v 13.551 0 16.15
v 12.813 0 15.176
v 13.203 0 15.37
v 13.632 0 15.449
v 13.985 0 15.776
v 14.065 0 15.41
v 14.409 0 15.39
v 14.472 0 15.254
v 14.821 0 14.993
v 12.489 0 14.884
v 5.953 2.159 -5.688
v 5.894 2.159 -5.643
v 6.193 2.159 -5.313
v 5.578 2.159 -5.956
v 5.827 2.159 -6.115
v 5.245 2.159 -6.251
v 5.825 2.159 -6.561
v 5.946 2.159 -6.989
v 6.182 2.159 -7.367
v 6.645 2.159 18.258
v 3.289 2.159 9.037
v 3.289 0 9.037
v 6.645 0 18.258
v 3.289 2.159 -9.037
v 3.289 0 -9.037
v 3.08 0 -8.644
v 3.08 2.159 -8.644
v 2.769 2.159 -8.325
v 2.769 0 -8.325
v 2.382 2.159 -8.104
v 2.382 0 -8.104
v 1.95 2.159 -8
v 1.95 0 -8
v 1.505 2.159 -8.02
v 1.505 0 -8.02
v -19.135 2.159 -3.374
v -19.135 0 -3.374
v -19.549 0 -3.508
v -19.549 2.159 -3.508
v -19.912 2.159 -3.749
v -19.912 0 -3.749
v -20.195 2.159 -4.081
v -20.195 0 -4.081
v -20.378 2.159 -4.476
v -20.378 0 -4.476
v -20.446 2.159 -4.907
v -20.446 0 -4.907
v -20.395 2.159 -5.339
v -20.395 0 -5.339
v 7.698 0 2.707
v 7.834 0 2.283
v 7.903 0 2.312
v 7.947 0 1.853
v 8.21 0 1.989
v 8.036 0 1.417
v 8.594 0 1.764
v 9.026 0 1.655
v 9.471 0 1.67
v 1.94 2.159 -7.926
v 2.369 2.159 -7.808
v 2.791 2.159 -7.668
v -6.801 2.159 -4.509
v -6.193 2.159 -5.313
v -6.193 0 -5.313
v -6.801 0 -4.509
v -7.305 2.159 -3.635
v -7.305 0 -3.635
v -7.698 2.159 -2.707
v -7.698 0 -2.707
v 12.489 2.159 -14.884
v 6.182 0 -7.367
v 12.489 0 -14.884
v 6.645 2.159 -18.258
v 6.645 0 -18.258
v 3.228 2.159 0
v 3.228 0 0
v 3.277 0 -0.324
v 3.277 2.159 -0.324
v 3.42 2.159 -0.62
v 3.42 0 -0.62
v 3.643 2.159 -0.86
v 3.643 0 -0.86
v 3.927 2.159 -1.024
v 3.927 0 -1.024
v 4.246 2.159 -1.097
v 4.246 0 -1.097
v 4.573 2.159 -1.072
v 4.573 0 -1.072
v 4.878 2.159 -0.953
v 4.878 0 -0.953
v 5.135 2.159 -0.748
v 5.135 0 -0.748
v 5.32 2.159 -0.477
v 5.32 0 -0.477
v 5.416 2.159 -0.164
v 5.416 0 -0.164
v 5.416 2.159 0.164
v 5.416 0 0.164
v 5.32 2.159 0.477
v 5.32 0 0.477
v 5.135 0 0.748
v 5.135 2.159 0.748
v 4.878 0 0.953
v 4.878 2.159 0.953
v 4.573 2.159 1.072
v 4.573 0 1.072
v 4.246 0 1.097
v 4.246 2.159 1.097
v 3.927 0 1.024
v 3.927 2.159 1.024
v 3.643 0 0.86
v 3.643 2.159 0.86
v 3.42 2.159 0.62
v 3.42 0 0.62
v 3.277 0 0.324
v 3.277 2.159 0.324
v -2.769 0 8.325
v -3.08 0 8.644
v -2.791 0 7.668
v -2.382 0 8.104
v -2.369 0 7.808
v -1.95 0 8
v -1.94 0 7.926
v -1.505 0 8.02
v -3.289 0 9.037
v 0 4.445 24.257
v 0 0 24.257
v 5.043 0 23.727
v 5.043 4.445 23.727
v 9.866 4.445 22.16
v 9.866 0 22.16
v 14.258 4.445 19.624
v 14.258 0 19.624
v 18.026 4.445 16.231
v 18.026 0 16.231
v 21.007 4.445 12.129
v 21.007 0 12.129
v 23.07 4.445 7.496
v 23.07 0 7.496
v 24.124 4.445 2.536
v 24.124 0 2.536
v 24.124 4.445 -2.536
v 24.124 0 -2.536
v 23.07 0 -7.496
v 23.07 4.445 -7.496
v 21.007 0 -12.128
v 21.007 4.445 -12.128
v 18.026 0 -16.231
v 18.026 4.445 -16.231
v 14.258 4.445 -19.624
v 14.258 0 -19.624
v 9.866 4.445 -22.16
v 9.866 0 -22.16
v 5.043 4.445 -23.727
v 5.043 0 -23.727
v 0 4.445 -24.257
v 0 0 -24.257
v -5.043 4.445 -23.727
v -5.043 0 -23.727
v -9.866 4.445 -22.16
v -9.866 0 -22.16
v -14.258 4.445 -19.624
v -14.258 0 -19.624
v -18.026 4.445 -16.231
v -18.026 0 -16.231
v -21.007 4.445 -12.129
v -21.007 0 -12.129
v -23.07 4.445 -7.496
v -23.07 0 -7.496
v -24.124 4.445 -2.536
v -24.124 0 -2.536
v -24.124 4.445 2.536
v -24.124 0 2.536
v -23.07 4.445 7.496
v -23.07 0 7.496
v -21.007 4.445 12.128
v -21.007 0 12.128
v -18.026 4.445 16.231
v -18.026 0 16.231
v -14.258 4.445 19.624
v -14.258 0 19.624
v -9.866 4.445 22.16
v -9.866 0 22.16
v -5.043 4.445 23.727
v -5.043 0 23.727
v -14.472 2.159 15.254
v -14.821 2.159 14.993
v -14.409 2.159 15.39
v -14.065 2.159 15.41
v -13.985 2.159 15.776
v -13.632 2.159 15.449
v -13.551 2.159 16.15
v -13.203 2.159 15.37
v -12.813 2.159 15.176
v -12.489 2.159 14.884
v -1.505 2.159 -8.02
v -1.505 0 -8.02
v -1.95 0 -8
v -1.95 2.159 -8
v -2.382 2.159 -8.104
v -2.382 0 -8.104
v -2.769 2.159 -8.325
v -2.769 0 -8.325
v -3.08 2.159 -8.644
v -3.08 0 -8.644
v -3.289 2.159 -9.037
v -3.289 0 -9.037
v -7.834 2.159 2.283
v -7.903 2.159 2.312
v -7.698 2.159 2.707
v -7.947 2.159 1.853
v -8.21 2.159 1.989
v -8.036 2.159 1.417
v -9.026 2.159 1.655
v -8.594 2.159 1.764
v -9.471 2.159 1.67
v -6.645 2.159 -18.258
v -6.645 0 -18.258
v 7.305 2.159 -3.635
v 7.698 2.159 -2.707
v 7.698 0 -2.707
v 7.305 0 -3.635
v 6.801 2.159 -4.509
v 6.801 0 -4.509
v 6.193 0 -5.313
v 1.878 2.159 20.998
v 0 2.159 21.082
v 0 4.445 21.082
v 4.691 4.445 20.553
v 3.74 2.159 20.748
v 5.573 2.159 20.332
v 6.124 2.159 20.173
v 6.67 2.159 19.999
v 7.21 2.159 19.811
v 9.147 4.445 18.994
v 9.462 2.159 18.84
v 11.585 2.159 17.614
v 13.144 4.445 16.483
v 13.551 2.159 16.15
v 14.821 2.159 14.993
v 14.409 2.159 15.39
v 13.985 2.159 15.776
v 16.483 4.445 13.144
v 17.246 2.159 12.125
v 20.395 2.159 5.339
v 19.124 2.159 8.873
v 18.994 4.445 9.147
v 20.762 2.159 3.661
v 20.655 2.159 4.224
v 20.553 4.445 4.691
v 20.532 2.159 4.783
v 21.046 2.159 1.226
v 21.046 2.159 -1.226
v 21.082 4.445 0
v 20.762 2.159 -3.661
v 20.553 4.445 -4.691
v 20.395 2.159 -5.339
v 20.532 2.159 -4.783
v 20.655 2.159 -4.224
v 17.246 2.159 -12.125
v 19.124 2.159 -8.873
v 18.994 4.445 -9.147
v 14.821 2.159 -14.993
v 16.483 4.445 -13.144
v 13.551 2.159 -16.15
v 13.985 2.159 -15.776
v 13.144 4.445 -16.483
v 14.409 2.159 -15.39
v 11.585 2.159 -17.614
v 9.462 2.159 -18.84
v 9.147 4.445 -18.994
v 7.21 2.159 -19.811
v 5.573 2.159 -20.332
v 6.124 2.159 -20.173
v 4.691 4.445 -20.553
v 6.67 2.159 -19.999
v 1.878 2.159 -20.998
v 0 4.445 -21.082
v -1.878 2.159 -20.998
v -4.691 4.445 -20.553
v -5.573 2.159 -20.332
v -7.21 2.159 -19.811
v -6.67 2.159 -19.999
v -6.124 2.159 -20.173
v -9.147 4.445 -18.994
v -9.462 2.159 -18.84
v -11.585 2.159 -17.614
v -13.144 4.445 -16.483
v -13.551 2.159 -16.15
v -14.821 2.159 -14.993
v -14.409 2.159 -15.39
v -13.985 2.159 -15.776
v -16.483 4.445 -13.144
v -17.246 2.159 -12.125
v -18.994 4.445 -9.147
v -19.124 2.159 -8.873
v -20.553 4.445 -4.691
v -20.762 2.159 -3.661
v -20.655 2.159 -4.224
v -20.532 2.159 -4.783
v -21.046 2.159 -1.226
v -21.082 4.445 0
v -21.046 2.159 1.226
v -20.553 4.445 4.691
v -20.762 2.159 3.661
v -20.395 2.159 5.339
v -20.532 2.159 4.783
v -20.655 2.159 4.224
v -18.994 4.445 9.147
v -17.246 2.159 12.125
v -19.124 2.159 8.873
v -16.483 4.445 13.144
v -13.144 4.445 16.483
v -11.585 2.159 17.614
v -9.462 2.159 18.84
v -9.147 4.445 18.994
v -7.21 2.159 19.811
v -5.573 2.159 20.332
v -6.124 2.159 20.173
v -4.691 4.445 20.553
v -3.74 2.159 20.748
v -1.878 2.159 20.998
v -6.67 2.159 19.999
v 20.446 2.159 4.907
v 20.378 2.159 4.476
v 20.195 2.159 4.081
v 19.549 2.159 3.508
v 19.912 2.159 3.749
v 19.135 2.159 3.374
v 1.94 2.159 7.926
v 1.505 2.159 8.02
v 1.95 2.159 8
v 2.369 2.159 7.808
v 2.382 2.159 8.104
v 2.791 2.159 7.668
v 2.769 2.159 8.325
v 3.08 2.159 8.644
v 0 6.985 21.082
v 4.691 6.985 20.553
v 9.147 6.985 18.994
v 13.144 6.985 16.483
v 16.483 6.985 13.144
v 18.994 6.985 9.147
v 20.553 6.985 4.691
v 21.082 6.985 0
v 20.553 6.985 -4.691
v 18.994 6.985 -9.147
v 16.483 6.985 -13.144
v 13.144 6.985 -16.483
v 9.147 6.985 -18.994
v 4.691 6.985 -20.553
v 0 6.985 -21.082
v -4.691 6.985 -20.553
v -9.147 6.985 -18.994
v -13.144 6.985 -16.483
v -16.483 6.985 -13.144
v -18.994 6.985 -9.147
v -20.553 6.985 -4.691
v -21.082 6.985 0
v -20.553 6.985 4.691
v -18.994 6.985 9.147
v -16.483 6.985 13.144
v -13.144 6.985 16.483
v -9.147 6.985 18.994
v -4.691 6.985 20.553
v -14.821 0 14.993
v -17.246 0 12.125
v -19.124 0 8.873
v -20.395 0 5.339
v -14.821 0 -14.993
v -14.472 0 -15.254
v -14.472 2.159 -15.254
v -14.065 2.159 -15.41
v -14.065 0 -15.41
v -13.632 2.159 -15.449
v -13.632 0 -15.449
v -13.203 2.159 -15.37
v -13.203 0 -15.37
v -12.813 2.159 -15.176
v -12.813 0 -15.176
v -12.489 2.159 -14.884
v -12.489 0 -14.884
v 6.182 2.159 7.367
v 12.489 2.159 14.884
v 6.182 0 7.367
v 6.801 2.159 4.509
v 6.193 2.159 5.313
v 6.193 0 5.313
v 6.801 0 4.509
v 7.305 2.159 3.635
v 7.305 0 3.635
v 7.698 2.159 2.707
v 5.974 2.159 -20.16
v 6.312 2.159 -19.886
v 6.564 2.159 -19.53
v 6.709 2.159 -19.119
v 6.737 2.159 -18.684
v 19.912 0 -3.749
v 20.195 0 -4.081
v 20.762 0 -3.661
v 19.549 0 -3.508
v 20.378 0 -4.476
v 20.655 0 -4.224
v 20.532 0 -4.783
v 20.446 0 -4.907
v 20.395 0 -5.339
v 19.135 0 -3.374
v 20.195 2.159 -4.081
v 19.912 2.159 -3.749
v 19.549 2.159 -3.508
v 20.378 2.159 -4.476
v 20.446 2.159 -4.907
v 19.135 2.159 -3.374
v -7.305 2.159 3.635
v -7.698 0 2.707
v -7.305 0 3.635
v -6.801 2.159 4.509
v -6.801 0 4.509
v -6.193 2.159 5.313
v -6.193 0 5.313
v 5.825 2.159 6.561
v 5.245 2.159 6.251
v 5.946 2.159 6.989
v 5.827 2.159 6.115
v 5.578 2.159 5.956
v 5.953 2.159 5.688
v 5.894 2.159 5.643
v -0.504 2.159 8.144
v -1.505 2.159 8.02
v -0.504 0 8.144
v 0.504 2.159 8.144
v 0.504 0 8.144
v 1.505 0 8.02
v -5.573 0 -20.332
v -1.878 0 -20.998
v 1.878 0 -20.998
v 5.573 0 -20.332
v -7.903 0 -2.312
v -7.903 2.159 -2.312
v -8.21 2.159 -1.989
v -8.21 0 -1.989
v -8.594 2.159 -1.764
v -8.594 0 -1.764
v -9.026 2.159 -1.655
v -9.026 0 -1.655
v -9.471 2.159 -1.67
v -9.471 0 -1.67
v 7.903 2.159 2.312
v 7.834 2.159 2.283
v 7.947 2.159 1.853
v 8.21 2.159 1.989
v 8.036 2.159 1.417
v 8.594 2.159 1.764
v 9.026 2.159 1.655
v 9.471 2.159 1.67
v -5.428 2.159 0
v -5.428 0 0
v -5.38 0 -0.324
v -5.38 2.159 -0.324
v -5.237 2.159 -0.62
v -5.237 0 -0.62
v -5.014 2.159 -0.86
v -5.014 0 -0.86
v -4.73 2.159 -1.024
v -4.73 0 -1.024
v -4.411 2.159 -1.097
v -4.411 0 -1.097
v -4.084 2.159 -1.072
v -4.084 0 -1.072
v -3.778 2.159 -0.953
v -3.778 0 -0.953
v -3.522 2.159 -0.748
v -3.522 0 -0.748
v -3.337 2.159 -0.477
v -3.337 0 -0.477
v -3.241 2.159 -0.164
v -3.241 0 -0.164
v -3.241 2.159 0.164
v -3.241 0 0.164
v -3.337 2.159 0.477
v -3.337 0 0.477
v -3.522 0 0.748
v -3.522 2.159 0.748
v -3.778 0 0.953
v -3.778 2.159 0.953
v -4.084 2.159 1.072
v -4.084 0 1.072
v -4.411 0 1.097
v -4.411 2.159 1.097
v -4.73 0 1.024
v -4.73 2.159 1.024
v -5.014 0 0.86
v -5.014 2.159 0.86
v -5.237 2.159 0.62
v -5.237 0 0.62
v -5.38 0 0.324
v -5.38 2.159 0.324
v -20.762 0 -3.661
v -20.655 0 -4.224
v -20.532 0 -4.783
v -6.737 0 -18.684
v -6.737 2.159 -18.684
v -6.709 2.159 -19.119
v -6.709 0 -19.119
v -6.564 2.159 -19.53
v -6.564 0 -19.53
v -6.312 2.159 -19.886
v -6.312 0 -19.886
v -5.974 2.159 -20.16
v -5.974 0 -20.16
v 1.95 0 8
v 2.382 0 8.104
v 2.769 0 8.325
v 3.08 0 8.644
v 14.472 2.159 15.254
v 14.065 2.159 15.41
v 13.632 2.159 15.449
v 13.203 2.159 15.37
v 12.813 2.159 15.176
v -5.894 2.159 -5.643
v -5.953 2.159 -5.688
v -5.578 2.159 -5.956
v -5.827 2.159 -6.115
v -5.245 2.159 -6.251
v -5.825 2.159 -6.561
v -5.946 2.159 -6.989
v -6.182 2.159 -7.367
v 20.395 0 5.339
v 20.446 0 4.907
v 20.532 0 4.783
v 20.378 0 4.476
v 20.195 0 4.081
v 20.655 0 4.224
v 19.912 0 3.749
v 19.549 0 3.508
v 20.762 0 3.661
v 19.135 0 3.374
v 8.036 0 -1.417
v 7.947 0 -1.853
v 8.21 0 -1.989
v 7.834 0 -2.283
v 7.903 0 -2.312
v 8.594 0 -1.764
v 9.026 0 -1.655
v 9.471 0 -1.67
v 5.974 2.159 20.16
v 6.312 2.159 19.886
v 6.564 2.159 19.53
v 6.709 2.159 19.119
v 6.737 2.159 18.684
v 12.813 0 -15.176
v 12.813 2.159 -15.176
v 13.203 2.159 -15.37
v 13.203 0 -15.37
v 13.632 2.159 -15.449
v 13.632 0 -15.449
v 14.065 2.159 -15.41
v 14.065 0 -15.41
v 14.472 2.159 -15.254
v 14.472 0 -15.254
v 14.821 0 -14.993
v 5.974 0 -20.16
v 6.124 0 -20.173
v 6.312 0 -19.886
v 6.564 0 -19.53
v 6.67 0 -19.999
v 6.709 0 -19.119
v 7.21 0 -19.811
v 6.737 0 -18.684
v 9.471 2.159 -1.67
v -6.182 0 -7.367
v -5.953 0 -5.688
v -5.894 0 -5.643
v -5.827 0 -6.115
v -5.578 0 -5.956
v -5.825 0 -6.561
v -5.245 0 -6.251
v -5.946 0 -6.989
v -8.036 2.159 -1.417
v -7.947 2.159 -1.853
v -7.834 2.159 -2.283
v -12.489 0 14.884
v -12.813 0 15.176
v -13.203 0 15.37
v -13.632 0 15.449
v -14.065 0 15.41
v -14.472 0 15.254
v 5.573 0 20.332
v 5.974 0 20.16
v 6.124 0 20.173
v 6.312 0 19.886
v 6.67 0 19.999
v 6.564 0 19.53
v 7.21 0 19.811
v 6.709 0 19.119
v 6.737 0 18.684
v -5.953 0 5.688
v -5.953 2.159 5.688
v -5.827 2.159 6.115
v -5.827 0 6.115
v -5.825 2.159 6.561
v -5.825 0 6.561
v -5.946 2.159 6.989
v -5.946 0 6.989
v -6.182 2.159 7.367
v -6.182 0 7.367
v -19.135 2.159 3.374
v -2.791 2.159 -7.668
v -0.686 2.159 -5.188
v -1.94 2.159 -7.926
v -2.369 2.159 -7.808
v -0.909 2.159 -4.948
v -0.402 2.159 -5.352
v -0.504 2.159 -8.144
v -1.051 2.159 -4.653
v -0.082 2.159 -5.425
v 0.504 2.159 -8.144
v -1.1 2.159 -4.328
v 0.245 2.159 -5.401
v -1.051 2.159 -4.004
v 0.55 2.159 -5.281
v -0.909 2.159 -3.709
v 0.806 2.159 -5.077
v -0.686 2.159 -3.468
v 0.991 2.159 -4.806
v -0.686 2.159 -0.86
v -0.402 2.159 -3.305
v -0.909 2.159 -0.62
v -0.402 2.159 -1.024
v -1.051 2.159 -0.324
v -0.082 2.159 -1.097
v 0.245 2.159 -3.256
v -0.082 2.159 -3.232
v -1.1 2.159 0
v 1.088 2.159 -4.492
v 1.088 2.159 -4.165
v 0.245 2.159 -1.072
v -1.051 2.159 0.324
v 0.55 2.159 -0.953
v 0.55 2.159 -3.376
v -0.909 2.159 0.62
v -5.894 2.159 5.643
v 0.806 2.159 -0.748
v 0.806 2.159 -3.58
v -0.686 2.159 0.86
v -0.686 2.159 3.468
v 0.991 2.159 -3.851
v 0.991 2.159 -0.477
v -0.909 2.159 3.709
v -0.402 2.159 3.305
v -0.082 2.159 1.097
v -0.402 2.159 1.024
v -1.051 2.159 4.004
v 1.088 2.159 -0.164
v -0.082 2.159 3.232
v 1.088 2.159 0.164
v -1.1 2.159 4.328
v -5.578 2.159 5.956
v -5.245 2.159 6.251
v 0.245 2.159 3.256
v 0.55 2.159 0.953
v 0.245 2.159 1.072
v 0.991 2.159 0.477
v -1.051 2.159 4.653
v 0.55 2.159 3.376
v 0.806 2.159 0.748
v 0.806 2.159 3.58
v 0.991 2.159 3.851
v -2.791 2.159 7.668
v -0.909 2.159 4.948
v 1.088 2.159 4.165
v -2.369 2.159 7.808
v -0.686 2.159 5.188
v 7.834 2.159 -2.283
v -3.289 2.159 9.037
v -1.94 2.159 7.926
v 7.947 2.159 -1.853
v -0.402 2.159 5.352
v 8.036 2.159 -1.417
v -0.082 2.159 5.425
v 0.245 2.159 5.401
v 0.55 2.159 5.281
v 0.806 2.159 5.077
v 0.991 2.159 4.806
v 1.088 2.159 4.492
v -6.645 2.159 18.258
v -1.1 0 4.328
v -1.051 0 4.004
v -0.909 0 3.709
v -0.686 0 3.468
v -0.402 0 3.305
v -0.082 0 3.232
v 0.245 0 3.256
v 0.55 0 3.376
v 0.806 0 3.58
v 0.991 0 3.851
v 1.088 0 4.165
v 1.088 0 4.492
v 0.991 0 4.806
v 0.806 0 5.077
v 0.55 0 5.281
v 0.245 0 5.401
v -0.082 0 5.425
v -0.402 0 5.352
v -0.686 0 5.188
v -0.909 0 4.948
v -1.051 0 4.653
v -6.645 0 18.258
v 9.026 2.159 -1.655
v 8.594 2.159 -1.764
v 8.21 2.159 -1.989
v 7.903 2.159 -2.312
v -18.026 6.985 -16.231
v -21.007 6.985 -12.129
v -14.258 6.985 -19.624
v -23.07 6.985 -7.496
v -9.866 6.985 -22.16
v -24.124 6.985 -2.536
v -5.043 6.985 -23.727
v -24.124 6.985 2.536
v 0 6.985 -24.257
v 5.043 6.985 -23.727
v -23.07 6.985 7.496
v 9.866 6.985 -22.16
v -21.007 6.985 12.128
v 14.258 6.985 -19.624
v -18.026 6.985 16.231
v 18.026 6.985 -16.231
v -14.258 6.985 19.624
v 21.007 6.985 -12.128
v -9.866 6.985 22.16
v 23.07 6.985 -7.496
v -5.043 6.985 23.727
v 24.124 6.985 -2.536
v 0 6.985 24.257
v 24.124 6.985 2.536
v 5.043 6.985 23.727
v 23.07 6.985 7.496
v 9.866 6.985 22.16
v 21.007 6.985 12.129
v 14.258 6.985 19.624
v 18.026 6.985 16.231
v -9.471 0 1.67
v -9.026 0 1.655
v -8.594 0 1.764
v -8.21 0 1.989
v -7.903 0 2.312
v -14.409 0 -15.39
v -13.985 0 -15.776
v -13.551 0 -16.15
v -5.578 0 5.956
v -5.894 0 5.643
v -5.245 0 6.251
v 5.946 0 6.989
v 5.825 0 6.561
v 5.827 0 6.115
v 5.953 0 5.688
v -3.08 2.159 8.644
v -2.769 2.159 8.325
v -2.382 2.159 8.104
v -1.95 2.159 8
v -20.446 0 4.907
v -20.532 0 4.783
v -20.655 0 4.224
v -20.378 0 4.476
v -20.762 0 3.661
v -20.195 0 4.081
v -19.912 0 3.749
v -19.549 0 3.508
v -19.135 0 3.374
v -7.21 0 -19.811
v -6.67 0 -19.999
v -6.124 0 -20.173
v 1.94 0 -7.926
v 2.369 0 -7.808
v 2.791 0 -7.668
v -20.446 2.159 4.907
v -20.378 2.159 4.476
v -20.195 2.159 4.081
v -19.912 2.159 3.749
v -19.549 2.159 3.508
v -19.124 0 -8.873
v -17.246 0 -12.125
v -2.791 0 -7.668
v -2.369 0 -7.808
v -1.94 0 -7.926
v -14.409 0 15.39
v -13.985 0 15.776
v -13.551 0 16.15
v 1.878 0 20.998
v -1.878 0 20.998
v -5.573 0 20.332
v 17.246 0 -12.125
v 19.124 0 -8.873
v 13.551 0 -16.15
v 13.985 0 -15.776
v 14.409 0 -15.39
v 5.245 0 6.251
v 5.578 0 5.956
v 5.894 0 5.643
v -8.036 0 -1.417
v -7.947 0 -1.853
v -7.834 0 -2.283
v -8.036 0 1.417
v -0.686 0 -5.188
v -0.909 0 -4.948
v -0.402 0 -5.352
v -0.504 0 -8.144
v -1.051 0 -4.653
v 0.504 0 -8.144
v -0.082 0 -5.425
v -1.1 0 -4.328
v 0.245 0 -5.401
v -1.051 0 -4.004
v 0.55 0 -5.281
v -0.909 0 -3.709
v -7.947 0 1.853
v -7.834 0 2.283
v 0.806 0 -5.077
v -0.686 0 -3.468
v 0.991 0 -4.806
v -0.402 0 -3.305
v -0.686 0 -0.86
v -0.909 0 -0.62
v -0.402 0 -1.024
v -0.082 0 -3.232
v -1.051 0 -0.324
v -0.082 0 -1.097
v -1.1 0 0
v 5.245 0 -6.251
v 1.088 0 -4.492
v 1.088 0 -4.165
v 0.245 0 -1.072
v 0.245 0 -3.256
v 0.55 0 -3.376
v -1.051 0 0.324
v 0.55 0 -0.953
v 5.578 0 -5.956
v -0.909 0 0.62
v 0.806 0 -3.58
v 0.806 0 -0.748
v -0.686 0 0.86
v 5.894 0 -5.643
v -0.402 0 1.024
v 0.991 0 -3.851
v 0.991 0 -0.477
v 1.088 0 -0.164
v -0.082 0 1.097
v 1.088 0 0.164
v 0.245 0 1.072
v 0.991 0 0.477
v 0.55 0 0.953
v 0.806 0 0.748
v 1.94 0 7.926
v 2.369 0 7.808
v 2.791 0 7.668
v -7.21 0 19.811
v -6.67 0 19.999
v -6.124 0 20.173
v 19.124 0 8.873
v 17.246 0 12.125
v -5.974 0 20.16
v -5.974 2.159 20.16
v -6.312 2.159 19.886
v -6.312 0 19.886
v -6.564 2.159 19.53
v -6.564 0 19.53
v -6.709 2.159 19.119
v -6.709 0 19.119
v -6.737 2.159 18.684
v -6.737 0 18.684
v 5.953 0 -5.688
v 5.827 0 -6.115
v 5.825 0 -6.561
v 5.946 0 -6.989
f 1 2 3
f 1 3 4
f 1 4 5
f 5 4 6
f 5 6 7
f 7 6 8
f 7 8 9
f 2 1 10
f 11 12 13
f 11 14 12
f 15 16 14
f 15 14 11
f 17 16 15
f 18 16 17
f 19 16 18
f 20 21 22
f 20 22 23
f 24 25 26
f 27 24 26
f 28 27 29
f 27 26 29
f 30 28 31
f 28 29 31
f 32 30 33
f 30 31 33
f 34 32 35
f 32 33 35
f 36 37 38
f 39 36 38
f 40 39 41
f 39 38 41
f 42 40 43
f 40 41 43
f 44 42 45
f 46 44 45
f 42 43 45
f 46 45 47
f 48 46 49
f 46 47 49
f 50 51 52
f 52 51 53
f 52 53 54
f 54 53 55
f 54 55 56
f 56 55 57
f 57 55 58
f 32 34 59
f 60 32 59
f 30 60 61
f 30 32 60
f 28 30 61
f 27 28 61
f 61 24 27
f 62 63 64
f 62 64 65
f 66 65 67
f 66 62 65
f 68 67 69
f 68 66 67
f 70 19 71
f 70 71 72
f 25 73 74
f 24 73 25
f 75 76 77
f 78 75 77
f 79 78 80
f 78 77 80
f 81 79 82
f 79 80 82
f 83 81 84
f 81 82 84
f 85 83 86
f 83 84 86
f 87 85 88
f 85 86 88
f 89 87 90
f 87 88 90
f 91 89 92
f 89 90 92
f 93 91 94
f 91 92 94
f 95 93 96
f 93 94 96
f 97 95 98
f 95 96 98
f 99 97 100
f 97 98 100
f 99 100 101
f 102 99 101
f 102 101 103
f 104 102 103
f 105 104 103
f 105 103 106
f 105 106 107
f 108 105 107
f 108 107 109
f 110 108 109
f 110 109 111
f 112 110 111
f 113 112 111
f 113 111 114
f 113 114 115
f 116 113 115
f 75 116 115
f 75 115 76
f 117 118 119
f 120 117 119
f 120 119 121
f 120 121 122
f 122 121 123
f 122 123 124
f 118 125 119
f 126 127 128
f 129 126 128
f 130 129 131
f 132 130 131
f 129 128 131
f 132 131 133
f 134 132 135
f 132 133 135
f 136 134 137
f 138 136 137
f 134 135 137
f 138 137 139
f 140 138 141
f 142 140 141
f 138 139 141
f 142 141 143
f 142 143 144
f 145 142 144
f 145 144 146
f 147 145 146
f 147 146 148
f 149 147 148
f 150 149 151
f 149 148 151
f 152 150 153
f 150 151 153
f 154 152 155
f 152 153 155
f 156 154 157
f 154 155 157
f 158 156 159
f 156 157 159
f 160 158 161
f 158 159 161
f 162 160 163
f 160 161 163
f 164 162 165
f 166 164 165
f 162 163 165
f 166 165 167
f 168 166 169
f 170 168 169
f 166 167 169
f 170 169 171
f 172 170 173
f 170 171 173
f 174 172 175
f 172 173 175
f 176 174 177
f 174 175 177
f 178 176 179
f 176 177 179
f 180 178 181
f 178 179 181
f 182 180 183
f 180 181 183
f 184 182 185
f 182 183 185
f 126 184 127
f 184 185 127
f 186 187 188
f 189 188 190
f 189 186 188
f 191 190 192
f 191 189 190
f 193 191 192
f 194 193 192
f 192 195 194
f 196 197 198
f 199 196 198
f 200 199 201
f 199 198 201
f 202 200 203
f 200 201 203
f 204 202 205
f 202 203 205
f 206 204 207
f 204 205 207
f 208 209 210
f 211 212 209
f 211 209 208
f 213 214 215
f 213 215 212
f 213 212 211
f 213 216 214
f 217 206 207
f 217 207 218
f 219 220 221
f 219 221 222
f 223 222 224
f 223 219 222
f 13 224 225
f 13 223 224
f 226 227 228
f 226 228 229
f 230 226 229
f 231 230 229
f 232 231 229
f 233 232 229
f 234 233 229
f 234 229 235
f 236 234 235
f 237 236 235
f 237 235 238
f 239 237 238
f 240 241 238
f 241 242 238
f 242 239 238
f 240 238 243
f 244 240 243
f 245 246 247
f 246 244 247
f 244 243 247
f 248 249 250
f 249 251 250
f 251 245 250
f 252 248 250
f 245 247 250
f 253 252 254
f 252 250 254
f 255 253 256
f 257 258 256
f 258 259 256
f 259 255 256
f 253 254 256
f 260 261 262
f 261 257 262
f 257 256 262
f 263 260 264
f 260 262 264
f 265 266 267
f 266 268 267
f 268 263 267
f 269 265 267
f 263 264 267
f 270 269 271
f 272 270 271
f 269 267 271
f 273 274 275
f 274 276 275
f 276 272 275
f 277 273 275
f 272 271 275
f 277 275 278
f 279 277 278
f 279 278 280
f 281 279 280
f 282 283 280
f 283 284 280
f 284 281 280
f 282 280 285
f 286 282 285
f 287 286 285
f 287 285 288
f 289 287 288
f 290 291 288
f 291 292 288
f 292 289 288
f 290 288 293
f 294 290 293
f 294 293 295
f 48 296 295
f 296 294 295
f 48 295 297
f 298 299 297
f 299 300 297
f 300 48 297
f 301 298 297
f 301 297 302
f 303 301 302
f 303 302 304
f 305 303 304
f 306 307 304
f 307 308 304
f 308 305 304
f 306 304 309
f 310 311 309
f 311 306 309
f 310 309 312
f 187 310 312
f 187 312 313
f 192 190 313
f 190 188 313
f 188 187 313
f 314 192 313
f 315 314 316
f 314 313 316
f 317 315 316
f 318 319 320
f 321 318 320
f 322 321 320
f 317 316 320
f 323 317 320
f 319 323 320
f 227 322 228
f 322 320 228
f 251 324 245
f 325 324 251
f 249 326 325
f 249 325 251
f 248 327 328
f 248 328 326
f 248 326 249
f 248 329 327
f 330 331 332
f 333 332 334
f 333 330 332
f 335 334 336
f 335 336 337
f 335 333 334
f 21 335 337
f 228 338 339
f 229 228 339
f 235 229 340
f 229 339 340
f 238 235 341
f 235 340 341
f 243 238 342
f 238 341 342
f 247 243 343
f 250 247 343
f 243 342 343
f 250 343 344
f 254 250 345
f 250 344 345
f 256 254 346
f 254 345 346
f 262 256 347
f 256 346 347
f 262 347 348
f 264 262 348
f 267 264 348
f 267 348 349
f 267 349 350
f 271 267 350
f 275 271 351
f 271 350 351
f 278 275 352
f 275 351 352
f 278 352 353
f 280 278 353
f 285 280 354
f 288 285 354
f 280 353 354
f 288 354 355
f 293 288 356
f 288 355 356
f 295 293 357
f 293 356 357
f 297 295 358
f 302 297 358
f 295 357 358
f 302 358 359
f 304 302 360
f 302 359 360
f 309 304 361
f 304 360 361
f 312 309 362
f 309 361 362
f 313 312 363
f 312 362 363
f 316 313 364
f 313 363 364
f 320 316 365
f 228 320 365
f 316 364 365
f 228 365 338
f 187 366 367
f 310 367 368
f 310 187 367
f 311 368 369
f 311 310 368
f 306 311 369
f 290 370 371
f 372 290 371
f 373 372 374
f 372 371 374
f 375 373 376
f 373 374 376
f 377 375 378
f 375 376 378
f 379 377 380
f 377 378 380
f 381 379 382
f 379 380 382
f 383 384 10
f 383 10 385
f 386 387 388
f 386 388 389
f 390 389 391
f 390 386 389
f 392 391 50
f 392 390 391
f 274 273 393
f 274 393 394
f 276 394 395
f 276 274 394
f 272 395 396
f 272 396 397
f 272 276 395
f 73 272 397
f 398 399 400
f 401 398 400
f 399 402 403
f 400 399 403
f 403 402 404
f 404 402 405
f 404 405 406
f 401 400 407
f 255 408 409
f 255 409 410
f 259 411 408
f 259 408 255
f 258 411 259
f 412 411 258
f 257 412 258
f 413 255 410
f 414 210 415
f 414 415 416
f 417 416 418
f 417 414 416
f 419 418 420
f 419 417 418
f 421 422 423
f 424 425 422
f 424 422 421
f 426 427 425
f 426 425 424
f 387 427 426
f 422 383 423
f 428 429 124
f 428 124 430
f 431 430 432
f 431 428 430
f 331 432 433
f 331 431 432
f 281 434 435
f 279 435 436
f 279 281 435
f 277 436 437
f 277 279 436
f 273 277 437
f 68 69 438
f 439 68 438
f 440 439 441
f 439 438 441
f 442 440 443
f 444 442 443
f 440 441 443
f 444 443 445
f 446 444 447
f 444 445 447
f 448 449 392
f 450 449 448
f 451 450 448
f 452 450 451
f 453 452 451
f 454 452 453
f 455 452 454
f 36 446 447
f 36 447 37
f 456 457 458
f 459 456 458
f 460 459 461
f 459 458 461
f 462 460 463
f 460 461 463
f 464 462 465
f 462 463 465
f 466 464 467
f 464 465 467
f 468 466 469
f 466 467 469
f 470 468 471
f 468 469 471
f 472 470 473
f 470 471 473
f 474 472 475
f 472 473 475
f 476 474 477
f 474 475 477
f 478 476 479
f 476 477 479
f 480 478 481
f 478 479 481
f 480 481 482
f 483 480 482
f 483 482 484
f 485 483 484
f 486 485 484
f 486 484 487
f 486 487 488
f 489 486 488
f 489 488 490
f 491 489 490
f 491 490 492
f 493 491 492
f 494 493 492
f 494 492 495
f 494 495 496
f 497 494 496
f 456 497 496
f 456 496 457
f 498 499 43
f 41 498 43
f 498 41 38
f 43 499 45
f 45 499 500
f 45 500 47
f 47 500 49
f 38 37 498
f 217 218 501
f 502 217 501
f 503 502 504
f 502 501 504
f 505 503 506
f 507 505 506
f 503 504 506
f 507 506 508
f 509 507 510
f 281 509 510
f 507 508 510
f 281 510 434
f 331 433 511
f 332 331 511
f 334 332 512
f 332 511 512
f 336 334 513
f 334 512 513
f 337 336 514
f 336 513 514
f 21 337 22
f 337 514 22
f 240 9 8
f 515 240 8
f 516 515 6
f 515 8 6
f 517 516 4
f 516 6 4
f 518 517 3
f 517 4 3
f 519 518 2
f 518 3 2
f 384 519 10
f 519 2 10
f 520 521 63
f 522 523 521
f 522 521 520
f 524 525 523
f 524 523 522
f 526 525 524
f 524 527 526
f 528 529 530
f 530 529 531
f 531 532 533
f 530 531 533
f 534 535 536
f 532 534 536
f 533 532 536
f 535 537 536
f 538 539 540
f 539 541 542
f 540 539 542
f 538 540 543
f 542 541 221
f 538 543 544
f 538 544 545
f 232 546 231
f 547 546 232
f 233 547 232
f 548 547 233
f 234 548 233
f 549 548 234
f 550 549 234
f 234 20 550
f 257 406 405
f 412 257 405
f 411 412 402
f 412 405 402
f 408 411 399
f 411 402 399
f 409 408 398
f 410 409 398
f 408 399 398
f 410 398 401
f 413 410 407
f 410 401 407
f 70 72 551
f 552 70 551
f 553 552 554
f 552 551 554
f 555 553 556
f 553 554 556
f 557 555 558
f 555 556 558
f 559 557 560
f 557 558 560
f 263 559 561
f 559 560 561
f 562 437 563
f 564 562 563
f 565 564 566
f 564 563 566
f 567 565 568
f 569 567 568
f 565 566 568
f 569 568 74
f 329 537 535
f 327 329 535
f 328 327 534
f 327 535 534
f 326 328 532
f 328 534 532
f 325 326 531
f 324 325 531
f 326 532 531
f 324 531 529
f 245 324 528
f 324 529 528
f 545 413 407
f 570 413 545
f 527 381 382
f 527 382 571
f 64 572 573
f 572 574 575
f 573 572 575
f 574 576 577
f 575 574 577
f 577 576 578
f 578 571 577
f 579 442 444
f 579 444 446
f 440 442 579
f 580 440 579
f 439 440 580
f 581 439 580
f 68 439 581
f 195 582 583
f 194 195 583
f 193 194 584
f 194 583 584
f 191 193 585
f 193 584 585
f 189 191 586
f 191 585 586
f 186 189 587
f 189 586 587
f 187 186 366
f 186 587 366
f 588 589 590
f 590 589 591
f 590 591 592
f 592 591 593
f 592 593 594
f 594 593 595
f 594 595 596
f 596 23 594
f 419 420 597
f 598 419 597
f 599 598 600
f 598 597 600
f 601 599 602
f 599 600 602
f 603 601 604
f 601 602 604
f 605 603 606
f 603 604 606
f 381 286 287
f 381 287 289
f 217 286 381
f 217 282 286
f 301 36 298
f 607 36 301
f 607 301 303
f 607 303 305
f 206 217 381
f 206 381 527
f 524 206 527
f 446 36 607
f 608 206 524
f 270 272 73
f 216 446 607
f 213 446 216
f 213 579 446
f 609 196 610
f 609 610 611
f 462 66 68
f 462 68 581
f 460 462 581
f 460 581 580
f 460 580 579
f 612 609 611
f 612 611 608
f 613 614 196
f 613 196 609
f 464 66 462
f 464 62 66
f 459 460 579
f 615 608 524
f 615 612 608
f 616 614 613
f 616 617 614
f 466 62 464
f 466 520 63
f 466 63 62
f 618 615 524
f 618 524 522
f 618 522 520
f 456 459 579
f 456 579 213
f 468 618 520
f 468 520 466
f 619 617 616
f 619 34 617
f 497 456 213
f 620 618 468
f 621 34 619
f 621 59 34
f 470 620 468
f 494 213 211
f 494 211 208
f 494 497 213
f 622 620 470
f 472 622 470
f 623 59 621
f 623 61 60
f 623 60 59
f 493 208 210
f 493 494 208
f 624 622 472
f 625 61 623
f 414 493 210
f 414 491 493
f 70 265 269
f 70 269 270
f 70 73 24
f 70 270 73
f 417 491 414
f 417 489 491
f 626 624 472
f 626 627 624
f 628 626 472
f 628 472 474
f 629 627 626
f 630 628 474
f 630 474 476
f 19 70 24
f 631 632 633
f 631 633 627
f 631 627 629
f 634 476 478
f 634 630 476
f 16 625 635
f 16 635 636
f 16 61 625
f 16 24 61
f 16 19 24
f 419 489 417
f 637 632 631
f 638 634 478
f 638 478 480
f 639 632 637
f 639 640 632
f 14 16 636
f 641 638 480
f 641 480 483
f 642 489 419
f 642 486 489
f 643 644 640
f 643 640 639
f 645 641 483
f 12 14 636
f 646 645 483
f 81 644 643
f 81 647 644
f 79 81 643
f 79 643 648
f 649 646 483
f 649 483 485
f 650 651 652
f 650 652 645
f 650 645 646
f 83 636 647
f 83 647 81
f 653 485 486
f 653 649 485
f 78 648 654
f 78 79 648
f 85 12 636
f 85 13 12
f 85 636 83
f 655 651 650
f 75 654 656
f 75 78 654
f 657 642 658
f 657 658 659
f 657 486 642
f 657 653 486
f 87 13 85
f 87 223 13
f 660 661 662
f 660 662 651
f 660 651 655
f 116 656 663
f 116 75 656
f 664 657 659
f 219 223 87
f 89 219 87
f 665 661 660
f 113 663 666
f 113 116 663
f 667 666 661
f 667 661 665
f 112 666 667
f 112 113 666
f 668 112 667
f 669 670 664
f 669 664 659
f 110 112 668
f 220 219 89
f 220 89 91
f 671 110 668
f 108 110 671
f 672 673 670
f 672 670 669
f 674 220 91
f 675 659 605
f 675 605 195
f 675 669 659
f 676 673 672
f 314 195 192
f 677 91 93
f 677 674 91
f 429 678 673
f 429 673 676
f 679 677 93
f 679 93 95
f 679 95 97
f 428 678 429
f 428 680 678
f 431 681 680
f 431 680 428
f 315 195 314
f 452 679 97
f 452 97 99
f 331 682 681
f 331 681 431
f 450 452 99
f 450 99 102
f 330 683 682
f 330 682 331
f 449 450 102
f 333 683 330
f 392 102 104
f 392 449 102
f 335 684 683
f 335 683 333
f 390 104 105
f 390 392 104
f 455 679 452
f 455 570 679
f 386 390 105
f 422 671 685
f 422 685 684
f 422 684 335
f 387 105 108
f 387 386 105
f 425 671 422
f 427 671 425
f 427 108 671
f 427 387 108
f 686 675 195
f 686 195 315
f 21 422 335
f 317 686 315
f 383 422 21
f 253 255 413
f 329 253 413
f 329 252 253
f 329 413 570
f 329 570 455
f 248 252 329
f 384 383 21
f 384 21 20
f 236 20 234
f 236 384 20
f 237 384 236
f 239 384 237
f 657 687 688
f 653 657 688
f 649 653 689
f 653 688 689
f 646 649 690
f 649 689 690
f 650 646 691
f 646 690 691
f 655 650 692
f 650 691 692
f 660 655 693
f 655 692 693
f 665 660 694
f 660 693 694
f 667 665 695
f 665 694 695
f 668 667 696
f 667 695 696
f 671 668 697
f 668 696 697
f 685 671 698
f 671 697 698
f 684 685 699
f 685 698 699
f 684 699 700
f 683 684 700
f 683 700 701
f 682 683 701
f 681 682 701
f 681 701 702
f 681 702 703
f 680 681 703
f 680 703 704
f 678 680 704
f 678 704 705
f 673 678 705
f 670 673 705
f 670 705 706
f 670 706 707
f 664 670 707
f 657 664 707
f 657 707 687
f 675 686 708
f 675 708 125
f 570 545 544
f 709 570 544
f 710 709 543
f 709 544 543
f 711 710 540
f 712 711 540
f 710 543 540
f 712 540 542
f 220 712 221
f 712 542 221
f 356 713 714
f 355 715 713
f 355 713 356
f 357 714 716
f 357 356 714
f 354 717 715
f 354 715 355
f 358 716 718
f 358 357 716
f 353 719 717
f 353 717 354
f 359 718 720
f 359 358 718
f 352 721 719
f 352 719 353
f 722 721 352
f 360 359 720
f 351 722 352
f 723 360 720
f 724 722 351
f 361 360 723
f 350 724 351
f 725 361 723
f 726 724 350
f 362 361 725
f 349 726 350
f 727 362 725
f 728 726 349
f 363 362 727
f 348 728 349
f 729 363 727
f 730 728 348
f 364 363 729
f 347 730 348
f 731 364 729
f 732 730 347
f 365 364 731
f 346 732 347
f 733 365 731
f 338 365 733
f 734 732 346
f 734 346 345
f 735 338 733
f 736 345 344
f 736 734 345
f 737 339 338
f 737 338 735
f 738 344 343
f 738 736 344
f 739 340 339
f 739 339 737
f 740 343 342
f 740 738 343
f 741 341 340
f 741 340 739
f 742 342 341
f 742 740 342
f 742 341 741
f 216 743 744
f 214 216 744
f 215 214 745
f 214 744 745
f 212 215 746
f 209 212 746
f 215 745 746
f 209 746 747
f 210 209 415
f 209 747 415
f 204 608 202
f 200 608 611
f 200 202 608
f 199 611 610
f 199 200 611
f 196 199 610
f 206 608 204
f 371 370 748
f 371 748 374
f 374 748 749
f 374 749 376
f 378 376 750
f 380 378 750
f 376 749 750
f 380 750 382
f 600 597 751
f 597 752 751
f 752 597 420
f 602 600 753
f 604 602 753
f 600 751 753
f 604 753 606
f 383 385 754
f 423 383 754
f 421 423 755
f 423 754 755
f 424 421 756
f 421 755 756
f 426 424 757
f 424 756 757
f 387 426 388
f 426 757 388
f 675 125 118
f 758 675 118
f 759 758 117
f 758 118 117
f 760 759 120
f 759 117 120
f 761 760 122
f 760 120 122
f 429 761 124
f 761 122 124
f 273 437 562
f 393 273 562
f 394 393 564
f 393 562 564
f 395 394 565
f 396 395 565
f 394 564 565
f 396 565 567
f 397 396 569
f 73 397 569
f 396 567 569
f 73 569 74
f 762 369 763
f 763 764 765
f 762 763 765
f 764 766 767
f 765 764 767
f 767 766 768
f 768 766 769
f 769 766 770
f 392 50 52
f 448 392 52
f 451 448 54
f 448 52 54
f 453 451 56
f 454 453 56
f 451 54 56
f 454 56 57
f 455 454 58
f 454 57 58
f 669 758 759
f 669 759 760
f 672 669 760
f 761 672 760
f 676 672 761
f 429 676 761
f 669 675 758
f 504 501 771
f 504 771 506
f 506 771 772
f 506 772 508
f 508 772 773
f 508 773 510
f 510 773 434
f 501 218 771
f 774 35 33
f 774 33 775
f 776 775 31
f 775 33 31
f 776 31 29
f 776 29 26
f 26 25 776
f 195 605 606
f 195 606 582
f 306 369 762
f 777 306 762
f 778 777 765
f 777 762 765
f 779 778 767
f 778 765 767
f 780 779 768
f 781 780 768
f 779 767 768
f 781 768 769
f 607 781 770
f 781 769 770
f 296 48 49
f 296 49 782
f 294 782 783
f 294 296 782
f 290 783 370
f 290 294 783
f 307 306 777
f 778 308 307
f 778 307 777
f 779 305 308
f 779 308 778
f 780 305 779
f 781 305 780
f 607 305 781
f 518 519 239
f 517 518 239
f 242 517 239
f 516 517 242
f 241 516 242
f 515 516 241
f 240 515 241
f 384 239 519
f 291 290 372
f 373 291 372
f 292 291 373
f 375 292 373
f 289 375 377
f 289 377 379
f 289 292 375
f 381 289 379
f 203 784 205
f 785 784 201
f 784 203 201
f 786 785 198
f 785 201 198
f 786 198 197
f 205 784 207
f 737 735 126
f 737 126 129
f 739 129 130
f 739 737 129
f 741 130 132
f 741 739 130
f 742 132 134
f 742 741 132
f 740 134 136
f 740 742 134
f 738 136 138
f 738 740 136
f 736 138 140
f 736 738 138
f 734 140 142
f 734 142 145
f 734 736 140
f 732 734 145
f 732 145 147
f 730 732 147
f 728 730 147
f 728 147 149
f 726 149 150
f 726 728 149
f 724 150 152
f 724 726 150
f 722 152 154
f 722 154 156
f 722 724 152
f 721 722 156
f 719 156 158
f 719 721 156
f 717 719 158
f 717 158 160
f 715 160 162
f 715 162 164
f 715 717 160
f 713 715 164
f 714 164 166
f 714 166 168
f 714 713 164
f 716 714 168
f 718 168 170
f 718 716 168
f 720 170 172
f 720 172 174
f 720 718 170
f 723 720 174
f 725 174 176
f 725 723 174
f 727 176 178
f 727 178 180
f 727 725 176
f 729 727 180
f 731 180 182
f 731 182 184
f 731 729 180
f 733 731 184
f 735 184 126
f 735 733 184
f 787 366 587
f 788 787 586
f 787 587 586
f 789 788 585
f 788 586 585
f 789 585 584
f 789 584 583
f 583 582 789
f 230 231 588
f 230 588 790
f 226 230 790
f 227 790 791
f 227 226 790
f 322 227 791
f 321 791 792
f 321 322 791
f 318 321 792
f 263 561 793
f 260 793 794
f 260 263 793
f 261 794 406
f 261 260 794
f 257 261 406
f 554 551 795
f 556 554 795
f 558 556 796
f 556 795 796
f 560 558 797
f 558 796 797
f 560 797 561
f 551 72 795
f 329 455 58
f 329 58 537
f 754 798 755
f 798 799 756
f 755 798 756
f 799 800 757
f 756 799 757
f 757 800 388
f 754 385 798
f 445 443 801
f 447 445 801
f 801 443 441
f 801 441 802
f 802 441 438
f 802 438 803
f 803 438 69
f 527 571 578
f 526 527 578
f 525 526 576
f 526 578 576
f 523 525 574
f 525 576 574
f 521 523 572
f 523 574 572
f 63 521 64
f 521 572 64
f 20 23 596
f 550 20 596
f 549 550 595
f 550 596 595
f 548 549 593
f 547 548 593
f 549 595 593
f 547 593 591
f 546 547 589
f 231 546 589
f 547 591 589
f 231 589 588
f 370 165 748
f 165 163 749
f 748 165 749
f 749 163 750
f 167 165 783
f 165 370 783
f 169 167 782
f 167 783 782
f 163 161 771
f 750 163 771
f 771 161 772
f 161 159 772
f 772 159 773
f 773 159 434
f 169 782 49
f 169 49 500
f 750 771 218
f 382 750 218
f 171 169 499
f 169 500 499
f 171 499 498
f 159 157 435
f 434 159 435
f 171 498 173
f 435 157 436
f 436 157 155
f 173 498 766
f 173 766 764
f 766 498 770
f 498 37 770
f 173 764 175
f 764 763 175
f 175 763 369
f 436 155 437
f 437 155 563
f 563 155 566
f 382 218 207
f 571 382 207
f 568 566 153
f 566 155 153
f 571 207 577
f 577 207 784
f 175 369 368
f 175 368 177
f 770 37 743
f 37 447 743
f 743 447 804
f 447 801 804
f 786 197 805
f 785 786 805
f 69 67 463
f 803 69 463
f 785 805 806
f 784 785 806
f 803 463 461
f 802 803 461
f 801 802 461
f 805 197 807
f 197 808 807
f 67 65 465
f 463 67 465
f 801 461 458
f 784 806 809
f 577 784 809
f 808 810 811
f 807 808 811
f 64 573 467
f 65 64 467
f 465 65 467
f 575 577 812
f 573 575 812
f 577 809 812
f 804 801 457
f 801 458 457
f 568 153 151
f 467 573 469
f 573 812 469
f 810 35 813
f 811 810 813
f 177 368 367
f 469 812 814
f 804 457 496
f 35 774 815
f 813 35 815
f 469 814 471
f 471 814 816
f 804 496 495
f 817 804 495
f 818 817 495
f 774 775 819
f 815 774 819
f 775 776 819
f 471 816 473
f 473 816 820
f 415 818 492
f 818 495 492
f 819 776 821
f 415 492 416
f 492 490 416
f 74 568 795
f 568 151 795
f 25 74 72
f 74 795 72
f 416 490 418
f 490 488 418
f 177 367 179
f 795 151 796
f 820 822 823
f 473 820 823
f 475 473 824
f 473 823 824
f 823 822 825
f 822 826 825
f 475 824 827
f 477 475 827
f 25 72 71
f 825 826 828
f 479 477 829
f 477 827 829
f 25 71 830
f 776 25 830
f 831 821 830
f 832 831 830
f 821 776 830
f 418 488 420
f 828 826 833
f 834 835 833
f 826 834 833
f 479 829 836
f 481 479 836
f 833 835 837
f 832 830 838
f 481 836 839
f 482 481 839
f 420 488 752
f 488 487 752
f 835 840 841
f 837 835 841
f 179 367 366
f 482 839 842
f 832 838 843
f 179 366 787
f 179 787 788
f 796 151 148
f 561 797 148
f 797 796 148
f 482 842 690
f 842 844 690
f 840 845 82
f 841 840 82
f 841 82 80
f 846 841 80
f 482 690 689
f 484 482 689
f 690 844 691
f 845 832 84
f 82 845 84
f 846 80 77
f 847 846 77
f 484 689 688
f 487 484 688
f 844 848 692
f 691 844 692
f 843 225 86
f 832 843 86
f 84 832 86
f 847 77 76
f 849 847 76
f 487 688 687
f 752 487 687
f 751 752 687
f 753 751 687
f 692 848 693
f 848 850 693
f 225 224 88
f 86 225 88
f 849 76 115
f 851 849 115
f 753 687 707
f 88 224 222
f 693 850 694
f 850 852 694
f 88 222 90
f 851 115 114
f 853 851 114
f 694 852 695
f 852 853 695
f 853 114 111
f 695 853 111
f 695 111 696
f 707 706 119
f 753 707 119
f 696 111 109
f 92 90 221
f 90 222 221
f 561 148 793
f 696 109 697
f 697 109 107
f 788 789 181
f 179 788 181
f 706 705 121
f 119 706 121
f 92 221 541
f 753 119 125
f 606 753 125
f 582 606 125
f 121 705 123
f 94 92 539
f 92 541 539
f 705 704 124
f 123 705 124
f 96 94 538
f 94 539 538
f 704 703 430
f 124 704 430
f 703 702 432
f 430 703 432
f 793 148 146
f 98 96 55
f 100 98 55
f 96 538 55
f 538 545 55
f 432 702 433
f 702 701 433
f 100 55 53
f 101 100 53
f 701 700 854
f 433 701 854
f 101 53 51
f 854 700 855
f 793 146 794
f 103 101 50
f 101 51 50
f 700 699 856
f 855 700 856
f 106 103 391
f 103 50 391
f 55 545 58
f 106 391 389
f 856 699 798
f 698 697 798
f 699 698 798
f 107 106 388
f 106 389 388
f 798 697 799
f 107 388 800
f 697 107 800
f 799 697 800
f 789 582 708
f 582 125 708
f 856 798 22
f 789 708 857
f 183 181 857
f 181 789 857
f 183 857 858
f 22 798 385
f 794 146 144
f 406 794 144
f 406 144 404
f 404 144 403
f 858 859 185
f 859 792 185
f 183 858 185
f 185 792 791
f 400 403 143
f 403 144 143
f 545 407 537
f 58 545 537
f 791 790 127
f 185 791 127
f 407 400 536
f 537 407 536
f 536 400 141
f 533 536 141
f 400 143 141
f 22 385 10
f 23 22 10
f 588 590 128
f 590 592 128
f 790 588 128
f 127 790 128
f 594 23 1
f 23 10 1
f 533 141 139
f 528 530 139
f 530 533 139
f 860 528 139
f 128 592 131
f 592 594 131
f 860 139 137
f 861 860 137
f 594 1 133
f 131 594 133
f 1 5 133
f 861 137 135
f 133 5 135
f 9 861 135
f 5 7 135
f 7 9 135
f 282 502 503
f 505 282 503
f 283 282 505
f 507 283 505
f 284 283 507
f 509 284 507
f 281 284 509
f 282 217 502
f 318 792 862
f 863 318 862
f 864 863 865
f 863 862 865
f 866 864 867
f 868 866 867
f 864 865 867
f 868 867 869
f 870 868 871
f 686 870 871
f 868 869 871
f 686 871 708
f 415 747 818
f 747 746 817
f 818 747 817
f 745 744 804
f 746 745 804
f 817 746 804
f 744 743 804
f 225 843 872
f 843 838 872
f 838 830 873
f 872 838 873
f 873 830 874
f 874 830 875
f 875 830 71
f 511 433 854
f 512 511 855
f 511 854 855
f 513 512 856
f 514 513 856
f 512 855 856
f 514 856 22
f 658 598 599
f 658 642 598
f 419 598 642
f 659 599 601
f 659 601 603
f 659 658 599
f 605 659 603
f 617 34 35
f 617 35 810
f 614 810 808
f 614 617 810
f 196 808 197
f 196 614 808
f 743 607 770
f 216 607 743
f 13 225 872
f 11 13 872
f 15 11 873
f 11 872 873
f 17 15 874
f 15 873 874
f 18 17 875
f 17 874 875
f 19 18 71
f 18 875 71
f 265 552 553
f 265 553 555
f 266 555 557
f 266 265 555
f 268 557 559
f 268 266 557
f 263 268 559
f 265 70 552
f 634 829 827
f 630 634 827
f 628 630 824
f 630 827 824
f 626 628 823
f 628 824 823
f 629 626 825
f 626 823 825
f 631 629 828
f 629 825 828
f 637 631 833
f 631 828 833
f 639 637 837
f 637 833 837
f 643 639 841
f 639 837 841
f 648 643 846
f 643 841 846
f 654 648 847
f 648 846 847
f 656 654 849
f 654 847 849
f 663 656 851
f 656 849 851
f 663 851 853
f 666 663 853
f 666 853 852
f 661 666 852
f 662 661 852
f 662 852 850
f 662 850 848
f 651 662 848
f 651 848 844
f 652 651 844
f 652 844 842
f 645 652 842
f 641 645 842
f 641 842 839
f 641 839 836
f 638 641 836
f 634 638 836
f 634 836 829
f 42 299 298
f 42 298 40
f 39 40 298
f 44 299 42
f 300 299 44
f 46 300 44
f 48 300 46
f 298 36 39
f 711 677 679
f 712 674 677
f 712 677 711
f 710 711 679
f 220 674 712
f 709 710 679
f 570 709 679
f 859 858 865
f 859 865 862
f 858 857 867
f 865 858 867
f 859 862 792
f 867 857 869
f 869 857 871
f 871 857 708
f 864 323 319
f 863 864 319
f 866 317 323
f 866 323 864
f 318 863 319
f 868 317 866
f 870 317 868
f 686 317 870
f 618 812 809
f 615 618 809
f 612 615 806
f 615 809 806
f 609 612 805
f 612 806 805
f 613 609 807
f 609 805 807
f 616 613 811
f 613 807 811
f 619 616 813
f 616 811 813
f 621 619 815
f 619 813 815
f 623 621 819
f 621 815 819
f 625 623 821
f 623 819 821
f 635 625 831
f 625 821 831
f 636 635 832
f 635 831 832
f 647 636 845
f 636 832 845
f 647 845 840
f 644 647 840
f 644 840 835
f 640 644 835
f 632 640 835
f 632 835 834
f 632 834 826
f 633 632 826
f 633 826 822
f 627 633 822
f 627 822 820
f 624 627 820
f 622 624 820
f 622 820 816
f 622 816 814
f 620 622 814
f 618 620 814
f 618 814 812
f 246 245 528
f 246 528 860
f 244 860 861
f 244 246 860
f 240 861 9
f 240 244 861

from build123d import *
from build123d.topology import SkipClean

# Parameters (mm, degrees)
SKETCH1_R            = 24.257
BOSS_EXTRUDE1_DEPTH  = 4.445
M2_CLEARANCE_HOLE1_D = 2.2
SKETCH4_R            = 21.082
CUT_EXTRUDE1_DEPTH   = 2.286
CUT_EXTRUDE2_DEPTH   = 35.380661628
FILLET1_DEPTH        = 2.159
BOSS_EXTRUDE2_START  = 2.54
SKETCH6_R            = 24.257
SKETCH6_R_2          = 21.082
BOSS_EXTRUDE2_DEPTH  = 2.54


with BuildPart() as part:
    # Sketch1 → Boss-Extrude1 (new body)
    with BuildSketch(Plane(origin=(0, 0, 0), x_dir=(1, 0, 0), z_dir=(0, 1, 0))):
        with Locations(Location((0, 0, 0), (0, 0, 270))):
            Circle(SKETCH1_R)
    extrude(amount=BOSS_EXTRUDE1_DEPTH)

    # M2 Clearance Hole1 (through all)
    with Locations(Plane(origin=(0, 4.445, 0), x_dir=(1, 0, 0), z_dir=(0, 1, 0))):
        with Locations((0, 0), (0, 4.32848345), (0, -4.32848345), (-4.32848345, 0), (4.32848345, 0)):
            Hole(M2_CLEARANCE_HOLE1_D / 2)

    # Sketch4 → Cut-Extrude1 (cut)
    with BuildSketch(Plane(origin=(0, 4.445, 0), x_dir=(1, 0, 0), z_dir=(0, 1, 0))):
        with Locations(Location((0, 0, 0), (0, 0, 270))):
            Circle(SKETCH4_R)
    extrude(amount=-CUT_EXTRUDE1_DEPTH, mode=Mode.SUBTRACT)

    # Sketch5 → Cut-Extrude2 (cut, through all)
    with SkipClean():  # the faces are left unmerged after this step: merging them gives an invalid solid
        with BuildSketch(Plane(origin=(0, 2.159, 0), x_dir=(1, 0, 0), z_dir=(0, 1, 0))):
            with BuildLine():
                Line((-2.790798865, 7.667656862), (-7.210468662, 19.810599831))
                ThreePointArc((-7.210468662, 19.810599831), (0, 21.082), (7.210468662, 19.810599831))
                Line((7.210468662, 19.810599831), (2.790798865, 7.667656862))
                ThreePointArc((2.790798865, 7.667656862), (0, 8.15975), (-2.790798865, 7.667656862))
            make_face()
            with BuildLine():
                Line((5.244986198, 6.250731145), (13.551248387, 16.14974895))
                ThreePointArc((13.551248387, 16.14974895), (18.257547563, 10.541), (20.761717049, 3.660850882))
                Line((20.761717049, 3.660850882), (8.035785063, 1.416925718))
                ThreePointArc((8.035785063, 1.416925718), (7.066550789, 4.079875), (5.244986198, 6.250731145))
            make_face()
            with BuildLine():
                Line((8.035785063, -1.416925718), (20.761717049, -3.660850882))
                ThreePointArc((20.761717049, -3.660850882), (18.257547563, -10.541), (13.551248387, -16.14974895))
                Line((13.551248387, -16.14974895), (5.244986198, -6.250731145))
                ThreePointArc((5.244986198, -6.250731145), (7.066550789, -4.079875), (8.035785063, -1.416925718))
            make_face()
            with BuildLine():
                Line((2.790798865, -7.667656862), (7.210468662, -19.810599831))
                ThreePointArc((7.210468662, -19.810599831), (0, -21.082), (-7.210468662, -19.810599831))
                Line((-7.210468662, -19.810599831), (-2.790798865, -7.667656862))
                ThreePointArc((-2.790798865, -7.667656862), (0, -8.15975), (2.790798865, -7.667656862))
            make_face()
            with BuildLine():
                Line((-5.244986198, -6.250731145), (-13.551248387, -16.14974895))
                ThreePointArc((-13.551248387, -16.14974895), (-18.257547563, -10.541), (-20.761717049, -3.660850882))
                Line((-20.761717049, -3.660850882), (-8.035785063, -1.416925718))
                ThreePointArc((-8.035785063, -1.416925718), (-7.066550789, -4.079875), (-5.244986198, -6.250731145))
            make_face()
            with BuildLine():
                Line((-8.035785063, 1.416925718), (-20.761717049, 3.660850882))
                ThreePointArc((-20.761717049, 3.660850882), (-18.257547563, 10.541), (-13.551248387, 16.14974895))
                Line((-13.551248387, 16.14974895), (-5.244986198, 6.250731145))
                ThreePointArc((-5.244986198, 6.250731145), (-7.066550789, 4.079875), (-8.035785063, 1.416925718))
            make_face()
        extrude(amount=-CUT_EXTRUDE2_DEPTH, mode=Mode.SUBTRACT)

    # Fillet1: read off the stored shape, not the designer's step
    # Fillet1 outline → Fillet1 (add)
    with SkipClean():  # the faces are left unmerged after this step: merging them gives an invalid solid
        with BuildSketch(Plane(origin=(0, 0, 0), x_dir=(1, 0, 0), z_dir=(0, 1, 0))):
            with BuildLine():
                ThreePointArc((-5.573280223, -20.331976578), (-6.563834268, -19.529933732), (-6.645367543, -18.257997268))
                Line((-6.645367543, -18.257997268), (-7.210468662, -19.810599831))
                ThreePointArc((-7.210468662, -19.810599831), (-6.397188235, -20.087974181), (-5.573280223, -20.331976578))
            make_face()
            with BuildLine():
                Line((-2.790798865, -7.667656862), (-3.289243946, -9.037123468))
                ThreePointArc((-3.289243946, -9.037123468), (-2.583701402, -8.200944789), (-1.504732413, -8.019806757))
                ThreePointArc((-1.504732413, -8.019806757), (-2.154970911, -7.870045771), (-2.790798865, -7.667656862))
            make_face()
            with BuildLine():
                ThreePointArc((6.645367543, -18.257997268), (6.563834268, -19.529933732), (5.573280223, -20.331976578))
                ThreePointArc((5.573280223, -20.331976578), (6.397188235, -20.087974181), (7.210468662, -19.810599831))
                Line((7.210468662, -19.810599831), (6.645367543, -18.257997268))
            make_face()
            with BuildLine():
                ThreePointArc((-14.821368114, -14.992590544), (-14.198101834, -15.584114615), (-13.551248387, -16.14974895))
                Line((-13.551248387, -16.14974895), (-12.489205685, -14.884055743))
                ThreePointArc((-12.489205685, -14.884055743), (-13.631501612, -15.449414088), (-14.821368114, -14.992590544))
            make_face()
            with BuildLine():
                ThreePointArc((2.790798865, -7.667656862), (2.154970911, -7.870045771), (1.504732413, -8.019806757))
                ThreePointArc((1.504732413, -8.019806757), (2.583701402, -8.200944789), (3.289243946, -9.037123468))
                Line((3.289243946, -9.037123468), (2.790798865, -7.667656862))
            make_face()
            with BuildLine():
                Line((12.489205685, -14.884055743), (13.551248387, -16.14974895))
                ThreePointArc((13.551248387, -16.14974895), (14.198101834, -15.584114615), (14.821368114, -14.992590544))
                ThreePointArc((14.821368114, -14.992590544), (13.631501612, -15.449414088), (12.489205685, -14.884055743))
            make_face()
            with BuildLine():
                ThreePointArc((-6.192990179, -5.313039875), (-5.810375821, -6.338023444), (-6.181756528, -7.36713055))
                Line((-6.181756528, -7.36713055), (-5.244986198, -6.250731145))
                ThreePointArc((-5.244986198, -6.250731145), (-5.738174111, -5.801282439), (-6.192990179, -5.313039875))
            make_face()
            with BuildLine():
                ThreePointArc((-20.761717049, -3.660850882), (-20.595290068, -4.503859567), (-20.394648337, -5.339386034))
                ThreePointArc((-20.394648337, -5.339386034), (-20.19533588, -4.080519643), (-19.134573227, -3.373941524))
                Line((-19.134573227, -3.373941524), (-20.761717049, -3.660850882))
            make_face()
            with BuildLine():
                Line((5.244986198, -6.250731145), (6.181756528, -7.36713055))
                ThreePointArc((6.181756528, -7.36713055), (5.810375821, -6.338023444), (6.192990179, -5.313039875))
                ThreePointArc((6.192990179, -5.313039875), (5.738174111, -5.801282439), (5.244986198, -6.250731145))
            make_face()
            with BuildLine():
                ThreePointArc((19.134573227, -3.373941524), (20.19533588, -4.080519643), (20.394648337, -5.339386034))
                ThreePointArc((20.394648337, -5.339386034), (20.595290068, -4.503859567), (20.761717049, -3.660850882))
                Line((20.761717049, -3.660850882), (19.134573227, -3.373941524))
            make_face()
            with BuildLine():
                ThreePointArc((-9.471000473, -1.669992918), (-8.394077223, -1.862921344), (-7.697722592, -2.706766883))
                ThreePointArc((-7.697722592, -2.706766883), (-7.893145022, -2.068763332), (-8.035785063, -1.416925718))
                Line((-8.035785063, -1.416925718), (-9.471000473, -1.669992918))
            make_face()
            with BuildLine():
                ThreePointArc((-20.394648337, 5.339386034), (-20.595290068, 4.503859567), (-20.761717049, 3.660850882))
                Line((-20.761717049, 3.660850882), (-19.134573227, 3.373941524))
                ThreePointArc((-19.134573227, 3.373941524), (-20.19533588, 4.080519643), (-20.394648337, 5.339386034))
            make_face()
            with BuildLine():
                ThreePointArc((8.035785063, -1.416925718), (7.893145022, -2.068763332), (7.697722592, -2.706766883))
                ThreePointArc((7.697722592, -2.706766883), (8.394077223, -1.862921344), (9.471000473, -1.669992918))
                Line((9.471000473, -1.669992918), (8.035785063, -1.416925718))
            make_face()
            with BuildLine():
                ThreePointArc((-7.697722592, 2.706766883), (-8.394077223, 1.862921344), (-9.471000473, 1.669992918))
                Line((-9.471000473, 1.669992918), (-8.035785063, 1.416925718))
                ThreePointArc((-8.035785063, 1.416925718), (-7.893145022, 2.068763332), (-7.697722592, 2.706766883))
            make_face()
            with BuildLine():
                ThreePointArc((-13.551248387, 16.14974895), (-14.198101834, 15.584114615), (-14.821368114, 14.992590544))
                ThreePointArc((-14.821368114, 14.992590544), (-13.631501612, 15.449414088), (-12.489205685, 14.884055743))
                Line((-12.489205685, 14.884055743), (-13.551248387, 16.14974895))
            make_face()
            with BuildLine():
                Line((19.134573227, 3.373941524), (20.761717049, 3.660850882))
                ThreePointArc((20.761717049, 3.660850882), (20.595290068, 4.503859567), (20.394648337, 5.339386034))
                ThreePointArc((20.394648337, 5.339386034), (20.19533588, 4.080519643), (19.134573227, 3.373941524))
            make_face()
            with BuildLine():
                ThreePointArc((-6.181756528, 7.36713055), (-5.810375821, 6.338023444), (-6.192990179, 5.313039875))
                ThreePointArc((-6.192990179, 5.313039875), (-5.738174111, 5.801282439), (-5.244986198, 6.250731145))
                Line((-5.244986198, 6.250731145), (-6.181756528, 7.36713055))
            make_face()
            with BuildLine():
                ThreePointArc((-5.573280223, 20.331976578), (-6.397188235, 20.087974181), (-7.210468662, 19.810599831))
                Line((-7.210468662, 19.810599831), (-6.645367543, 18.257997268))
                ThreePointArc((-6.645367543, 18.257997268), (-6.563834268, 19.529933732), (-5.573280223, 20.331976578))
            make_face()
            with BuildLine():
                Line((8.035785063, 1.416925718), (9.471000473, 1.669992918))
                ThreePointArc((9.471000473, 1.669992918), (8.394077223, 1.862921344), (7.697722592, 2.706766883))
                ThreePointArc((7.697722592, 2.706766883), (7.893145022, 2.068763332), (8.035785063, 1.416925718))
            make_face()
            with BuildLine():
                ThreePointArc((12.489205685, 14.884055743), (13.631501612, 15.449414088), (14.821368114, 14.992590544))
                ThreePointArc((14.821368114, 14.992590544), (14.198101834, 15.584114615), (13.551248387, 16.14974895))
                Line((13.551248387, 16.14974895), (12.489205685, 14.884055743))
            make_face()
            with BuildLine():
                ThreePointArc((-1.504732413, 8.019806757), (-2.583701402, 8.200944789), (-3.289243946, 9.037123468))
                Line((-3.289243946, 9.037123468), (-2.790798865, 7.667656862))
                ThreePointArc((-2.790798865, 7.667656862), (-2.154970911, 7.870045771), (-1.504732413, 8.019806757))
            make_face()
            with BuildLine():
                ThreePointArc((7.210468662, 19.810599831), (6.397188235, 20.087974181), (5.573280223, 20.331976578))
                ThreePointArc((5.573280223, 20.331976578), (6.563834268, 19.529933732), (6.645367543, 18.257997268))
                Line((6.645367543, 18.257997268), (7.210468662, 19.810599831))
            make_face()
            with BuildLine():
                ThreePointArc((5.244986198, 6.250731145), (5.738174111, 5.801282439), (6.192990179, 5.313039875))
                ThreePointArc((6.192990179, 5.313039875), (5.810375821, 6.338023444), (6.181756528, 7.36713055))
                Line((6.181756528, 7.36713055), (5.244986198, 6.250731145))
            make_face()
            with BuildLine():
                ThreePointArc((3.289243946, 9.037123468), (2.583701402, 8.200944789), (1.504732413, 8.019806757))
                ThreePointArc((1.504732413, 8.019806757), (2.154970911, 7.870045771), (2.790798865, 7.667656862))
                Line((2.790798865, 7.667656862), (3.289243946, 9.037123468))
            make_face()
        extrude(amount=FILLET1_DEPTH)

    # Sketch6 → Boss-Extrude2 (add)
    with SkipClean():  # the faces are left unmerged after this step: merging them gives an invalid solid
        with BuildSketch(Plane(origin=(0, 4.445, 0), x_dir=(1, 0, 0), z_dir=(0, 1, 0)).offset(BOSS_EXTRUDE2_START)):
            with Locations(Location((0, 0, 0), (0, 0, 270))):
                Circle(SKETCH6_R)
            with Locations(Location((0, 0, 0), (0, 0, 270))):
                Circle(SKETCH6_R_2, mode=Mode.SUBTRACT)
        extrude(amount=-BOSS_EXTRUDE2_DEPTH)


solid = part.part
